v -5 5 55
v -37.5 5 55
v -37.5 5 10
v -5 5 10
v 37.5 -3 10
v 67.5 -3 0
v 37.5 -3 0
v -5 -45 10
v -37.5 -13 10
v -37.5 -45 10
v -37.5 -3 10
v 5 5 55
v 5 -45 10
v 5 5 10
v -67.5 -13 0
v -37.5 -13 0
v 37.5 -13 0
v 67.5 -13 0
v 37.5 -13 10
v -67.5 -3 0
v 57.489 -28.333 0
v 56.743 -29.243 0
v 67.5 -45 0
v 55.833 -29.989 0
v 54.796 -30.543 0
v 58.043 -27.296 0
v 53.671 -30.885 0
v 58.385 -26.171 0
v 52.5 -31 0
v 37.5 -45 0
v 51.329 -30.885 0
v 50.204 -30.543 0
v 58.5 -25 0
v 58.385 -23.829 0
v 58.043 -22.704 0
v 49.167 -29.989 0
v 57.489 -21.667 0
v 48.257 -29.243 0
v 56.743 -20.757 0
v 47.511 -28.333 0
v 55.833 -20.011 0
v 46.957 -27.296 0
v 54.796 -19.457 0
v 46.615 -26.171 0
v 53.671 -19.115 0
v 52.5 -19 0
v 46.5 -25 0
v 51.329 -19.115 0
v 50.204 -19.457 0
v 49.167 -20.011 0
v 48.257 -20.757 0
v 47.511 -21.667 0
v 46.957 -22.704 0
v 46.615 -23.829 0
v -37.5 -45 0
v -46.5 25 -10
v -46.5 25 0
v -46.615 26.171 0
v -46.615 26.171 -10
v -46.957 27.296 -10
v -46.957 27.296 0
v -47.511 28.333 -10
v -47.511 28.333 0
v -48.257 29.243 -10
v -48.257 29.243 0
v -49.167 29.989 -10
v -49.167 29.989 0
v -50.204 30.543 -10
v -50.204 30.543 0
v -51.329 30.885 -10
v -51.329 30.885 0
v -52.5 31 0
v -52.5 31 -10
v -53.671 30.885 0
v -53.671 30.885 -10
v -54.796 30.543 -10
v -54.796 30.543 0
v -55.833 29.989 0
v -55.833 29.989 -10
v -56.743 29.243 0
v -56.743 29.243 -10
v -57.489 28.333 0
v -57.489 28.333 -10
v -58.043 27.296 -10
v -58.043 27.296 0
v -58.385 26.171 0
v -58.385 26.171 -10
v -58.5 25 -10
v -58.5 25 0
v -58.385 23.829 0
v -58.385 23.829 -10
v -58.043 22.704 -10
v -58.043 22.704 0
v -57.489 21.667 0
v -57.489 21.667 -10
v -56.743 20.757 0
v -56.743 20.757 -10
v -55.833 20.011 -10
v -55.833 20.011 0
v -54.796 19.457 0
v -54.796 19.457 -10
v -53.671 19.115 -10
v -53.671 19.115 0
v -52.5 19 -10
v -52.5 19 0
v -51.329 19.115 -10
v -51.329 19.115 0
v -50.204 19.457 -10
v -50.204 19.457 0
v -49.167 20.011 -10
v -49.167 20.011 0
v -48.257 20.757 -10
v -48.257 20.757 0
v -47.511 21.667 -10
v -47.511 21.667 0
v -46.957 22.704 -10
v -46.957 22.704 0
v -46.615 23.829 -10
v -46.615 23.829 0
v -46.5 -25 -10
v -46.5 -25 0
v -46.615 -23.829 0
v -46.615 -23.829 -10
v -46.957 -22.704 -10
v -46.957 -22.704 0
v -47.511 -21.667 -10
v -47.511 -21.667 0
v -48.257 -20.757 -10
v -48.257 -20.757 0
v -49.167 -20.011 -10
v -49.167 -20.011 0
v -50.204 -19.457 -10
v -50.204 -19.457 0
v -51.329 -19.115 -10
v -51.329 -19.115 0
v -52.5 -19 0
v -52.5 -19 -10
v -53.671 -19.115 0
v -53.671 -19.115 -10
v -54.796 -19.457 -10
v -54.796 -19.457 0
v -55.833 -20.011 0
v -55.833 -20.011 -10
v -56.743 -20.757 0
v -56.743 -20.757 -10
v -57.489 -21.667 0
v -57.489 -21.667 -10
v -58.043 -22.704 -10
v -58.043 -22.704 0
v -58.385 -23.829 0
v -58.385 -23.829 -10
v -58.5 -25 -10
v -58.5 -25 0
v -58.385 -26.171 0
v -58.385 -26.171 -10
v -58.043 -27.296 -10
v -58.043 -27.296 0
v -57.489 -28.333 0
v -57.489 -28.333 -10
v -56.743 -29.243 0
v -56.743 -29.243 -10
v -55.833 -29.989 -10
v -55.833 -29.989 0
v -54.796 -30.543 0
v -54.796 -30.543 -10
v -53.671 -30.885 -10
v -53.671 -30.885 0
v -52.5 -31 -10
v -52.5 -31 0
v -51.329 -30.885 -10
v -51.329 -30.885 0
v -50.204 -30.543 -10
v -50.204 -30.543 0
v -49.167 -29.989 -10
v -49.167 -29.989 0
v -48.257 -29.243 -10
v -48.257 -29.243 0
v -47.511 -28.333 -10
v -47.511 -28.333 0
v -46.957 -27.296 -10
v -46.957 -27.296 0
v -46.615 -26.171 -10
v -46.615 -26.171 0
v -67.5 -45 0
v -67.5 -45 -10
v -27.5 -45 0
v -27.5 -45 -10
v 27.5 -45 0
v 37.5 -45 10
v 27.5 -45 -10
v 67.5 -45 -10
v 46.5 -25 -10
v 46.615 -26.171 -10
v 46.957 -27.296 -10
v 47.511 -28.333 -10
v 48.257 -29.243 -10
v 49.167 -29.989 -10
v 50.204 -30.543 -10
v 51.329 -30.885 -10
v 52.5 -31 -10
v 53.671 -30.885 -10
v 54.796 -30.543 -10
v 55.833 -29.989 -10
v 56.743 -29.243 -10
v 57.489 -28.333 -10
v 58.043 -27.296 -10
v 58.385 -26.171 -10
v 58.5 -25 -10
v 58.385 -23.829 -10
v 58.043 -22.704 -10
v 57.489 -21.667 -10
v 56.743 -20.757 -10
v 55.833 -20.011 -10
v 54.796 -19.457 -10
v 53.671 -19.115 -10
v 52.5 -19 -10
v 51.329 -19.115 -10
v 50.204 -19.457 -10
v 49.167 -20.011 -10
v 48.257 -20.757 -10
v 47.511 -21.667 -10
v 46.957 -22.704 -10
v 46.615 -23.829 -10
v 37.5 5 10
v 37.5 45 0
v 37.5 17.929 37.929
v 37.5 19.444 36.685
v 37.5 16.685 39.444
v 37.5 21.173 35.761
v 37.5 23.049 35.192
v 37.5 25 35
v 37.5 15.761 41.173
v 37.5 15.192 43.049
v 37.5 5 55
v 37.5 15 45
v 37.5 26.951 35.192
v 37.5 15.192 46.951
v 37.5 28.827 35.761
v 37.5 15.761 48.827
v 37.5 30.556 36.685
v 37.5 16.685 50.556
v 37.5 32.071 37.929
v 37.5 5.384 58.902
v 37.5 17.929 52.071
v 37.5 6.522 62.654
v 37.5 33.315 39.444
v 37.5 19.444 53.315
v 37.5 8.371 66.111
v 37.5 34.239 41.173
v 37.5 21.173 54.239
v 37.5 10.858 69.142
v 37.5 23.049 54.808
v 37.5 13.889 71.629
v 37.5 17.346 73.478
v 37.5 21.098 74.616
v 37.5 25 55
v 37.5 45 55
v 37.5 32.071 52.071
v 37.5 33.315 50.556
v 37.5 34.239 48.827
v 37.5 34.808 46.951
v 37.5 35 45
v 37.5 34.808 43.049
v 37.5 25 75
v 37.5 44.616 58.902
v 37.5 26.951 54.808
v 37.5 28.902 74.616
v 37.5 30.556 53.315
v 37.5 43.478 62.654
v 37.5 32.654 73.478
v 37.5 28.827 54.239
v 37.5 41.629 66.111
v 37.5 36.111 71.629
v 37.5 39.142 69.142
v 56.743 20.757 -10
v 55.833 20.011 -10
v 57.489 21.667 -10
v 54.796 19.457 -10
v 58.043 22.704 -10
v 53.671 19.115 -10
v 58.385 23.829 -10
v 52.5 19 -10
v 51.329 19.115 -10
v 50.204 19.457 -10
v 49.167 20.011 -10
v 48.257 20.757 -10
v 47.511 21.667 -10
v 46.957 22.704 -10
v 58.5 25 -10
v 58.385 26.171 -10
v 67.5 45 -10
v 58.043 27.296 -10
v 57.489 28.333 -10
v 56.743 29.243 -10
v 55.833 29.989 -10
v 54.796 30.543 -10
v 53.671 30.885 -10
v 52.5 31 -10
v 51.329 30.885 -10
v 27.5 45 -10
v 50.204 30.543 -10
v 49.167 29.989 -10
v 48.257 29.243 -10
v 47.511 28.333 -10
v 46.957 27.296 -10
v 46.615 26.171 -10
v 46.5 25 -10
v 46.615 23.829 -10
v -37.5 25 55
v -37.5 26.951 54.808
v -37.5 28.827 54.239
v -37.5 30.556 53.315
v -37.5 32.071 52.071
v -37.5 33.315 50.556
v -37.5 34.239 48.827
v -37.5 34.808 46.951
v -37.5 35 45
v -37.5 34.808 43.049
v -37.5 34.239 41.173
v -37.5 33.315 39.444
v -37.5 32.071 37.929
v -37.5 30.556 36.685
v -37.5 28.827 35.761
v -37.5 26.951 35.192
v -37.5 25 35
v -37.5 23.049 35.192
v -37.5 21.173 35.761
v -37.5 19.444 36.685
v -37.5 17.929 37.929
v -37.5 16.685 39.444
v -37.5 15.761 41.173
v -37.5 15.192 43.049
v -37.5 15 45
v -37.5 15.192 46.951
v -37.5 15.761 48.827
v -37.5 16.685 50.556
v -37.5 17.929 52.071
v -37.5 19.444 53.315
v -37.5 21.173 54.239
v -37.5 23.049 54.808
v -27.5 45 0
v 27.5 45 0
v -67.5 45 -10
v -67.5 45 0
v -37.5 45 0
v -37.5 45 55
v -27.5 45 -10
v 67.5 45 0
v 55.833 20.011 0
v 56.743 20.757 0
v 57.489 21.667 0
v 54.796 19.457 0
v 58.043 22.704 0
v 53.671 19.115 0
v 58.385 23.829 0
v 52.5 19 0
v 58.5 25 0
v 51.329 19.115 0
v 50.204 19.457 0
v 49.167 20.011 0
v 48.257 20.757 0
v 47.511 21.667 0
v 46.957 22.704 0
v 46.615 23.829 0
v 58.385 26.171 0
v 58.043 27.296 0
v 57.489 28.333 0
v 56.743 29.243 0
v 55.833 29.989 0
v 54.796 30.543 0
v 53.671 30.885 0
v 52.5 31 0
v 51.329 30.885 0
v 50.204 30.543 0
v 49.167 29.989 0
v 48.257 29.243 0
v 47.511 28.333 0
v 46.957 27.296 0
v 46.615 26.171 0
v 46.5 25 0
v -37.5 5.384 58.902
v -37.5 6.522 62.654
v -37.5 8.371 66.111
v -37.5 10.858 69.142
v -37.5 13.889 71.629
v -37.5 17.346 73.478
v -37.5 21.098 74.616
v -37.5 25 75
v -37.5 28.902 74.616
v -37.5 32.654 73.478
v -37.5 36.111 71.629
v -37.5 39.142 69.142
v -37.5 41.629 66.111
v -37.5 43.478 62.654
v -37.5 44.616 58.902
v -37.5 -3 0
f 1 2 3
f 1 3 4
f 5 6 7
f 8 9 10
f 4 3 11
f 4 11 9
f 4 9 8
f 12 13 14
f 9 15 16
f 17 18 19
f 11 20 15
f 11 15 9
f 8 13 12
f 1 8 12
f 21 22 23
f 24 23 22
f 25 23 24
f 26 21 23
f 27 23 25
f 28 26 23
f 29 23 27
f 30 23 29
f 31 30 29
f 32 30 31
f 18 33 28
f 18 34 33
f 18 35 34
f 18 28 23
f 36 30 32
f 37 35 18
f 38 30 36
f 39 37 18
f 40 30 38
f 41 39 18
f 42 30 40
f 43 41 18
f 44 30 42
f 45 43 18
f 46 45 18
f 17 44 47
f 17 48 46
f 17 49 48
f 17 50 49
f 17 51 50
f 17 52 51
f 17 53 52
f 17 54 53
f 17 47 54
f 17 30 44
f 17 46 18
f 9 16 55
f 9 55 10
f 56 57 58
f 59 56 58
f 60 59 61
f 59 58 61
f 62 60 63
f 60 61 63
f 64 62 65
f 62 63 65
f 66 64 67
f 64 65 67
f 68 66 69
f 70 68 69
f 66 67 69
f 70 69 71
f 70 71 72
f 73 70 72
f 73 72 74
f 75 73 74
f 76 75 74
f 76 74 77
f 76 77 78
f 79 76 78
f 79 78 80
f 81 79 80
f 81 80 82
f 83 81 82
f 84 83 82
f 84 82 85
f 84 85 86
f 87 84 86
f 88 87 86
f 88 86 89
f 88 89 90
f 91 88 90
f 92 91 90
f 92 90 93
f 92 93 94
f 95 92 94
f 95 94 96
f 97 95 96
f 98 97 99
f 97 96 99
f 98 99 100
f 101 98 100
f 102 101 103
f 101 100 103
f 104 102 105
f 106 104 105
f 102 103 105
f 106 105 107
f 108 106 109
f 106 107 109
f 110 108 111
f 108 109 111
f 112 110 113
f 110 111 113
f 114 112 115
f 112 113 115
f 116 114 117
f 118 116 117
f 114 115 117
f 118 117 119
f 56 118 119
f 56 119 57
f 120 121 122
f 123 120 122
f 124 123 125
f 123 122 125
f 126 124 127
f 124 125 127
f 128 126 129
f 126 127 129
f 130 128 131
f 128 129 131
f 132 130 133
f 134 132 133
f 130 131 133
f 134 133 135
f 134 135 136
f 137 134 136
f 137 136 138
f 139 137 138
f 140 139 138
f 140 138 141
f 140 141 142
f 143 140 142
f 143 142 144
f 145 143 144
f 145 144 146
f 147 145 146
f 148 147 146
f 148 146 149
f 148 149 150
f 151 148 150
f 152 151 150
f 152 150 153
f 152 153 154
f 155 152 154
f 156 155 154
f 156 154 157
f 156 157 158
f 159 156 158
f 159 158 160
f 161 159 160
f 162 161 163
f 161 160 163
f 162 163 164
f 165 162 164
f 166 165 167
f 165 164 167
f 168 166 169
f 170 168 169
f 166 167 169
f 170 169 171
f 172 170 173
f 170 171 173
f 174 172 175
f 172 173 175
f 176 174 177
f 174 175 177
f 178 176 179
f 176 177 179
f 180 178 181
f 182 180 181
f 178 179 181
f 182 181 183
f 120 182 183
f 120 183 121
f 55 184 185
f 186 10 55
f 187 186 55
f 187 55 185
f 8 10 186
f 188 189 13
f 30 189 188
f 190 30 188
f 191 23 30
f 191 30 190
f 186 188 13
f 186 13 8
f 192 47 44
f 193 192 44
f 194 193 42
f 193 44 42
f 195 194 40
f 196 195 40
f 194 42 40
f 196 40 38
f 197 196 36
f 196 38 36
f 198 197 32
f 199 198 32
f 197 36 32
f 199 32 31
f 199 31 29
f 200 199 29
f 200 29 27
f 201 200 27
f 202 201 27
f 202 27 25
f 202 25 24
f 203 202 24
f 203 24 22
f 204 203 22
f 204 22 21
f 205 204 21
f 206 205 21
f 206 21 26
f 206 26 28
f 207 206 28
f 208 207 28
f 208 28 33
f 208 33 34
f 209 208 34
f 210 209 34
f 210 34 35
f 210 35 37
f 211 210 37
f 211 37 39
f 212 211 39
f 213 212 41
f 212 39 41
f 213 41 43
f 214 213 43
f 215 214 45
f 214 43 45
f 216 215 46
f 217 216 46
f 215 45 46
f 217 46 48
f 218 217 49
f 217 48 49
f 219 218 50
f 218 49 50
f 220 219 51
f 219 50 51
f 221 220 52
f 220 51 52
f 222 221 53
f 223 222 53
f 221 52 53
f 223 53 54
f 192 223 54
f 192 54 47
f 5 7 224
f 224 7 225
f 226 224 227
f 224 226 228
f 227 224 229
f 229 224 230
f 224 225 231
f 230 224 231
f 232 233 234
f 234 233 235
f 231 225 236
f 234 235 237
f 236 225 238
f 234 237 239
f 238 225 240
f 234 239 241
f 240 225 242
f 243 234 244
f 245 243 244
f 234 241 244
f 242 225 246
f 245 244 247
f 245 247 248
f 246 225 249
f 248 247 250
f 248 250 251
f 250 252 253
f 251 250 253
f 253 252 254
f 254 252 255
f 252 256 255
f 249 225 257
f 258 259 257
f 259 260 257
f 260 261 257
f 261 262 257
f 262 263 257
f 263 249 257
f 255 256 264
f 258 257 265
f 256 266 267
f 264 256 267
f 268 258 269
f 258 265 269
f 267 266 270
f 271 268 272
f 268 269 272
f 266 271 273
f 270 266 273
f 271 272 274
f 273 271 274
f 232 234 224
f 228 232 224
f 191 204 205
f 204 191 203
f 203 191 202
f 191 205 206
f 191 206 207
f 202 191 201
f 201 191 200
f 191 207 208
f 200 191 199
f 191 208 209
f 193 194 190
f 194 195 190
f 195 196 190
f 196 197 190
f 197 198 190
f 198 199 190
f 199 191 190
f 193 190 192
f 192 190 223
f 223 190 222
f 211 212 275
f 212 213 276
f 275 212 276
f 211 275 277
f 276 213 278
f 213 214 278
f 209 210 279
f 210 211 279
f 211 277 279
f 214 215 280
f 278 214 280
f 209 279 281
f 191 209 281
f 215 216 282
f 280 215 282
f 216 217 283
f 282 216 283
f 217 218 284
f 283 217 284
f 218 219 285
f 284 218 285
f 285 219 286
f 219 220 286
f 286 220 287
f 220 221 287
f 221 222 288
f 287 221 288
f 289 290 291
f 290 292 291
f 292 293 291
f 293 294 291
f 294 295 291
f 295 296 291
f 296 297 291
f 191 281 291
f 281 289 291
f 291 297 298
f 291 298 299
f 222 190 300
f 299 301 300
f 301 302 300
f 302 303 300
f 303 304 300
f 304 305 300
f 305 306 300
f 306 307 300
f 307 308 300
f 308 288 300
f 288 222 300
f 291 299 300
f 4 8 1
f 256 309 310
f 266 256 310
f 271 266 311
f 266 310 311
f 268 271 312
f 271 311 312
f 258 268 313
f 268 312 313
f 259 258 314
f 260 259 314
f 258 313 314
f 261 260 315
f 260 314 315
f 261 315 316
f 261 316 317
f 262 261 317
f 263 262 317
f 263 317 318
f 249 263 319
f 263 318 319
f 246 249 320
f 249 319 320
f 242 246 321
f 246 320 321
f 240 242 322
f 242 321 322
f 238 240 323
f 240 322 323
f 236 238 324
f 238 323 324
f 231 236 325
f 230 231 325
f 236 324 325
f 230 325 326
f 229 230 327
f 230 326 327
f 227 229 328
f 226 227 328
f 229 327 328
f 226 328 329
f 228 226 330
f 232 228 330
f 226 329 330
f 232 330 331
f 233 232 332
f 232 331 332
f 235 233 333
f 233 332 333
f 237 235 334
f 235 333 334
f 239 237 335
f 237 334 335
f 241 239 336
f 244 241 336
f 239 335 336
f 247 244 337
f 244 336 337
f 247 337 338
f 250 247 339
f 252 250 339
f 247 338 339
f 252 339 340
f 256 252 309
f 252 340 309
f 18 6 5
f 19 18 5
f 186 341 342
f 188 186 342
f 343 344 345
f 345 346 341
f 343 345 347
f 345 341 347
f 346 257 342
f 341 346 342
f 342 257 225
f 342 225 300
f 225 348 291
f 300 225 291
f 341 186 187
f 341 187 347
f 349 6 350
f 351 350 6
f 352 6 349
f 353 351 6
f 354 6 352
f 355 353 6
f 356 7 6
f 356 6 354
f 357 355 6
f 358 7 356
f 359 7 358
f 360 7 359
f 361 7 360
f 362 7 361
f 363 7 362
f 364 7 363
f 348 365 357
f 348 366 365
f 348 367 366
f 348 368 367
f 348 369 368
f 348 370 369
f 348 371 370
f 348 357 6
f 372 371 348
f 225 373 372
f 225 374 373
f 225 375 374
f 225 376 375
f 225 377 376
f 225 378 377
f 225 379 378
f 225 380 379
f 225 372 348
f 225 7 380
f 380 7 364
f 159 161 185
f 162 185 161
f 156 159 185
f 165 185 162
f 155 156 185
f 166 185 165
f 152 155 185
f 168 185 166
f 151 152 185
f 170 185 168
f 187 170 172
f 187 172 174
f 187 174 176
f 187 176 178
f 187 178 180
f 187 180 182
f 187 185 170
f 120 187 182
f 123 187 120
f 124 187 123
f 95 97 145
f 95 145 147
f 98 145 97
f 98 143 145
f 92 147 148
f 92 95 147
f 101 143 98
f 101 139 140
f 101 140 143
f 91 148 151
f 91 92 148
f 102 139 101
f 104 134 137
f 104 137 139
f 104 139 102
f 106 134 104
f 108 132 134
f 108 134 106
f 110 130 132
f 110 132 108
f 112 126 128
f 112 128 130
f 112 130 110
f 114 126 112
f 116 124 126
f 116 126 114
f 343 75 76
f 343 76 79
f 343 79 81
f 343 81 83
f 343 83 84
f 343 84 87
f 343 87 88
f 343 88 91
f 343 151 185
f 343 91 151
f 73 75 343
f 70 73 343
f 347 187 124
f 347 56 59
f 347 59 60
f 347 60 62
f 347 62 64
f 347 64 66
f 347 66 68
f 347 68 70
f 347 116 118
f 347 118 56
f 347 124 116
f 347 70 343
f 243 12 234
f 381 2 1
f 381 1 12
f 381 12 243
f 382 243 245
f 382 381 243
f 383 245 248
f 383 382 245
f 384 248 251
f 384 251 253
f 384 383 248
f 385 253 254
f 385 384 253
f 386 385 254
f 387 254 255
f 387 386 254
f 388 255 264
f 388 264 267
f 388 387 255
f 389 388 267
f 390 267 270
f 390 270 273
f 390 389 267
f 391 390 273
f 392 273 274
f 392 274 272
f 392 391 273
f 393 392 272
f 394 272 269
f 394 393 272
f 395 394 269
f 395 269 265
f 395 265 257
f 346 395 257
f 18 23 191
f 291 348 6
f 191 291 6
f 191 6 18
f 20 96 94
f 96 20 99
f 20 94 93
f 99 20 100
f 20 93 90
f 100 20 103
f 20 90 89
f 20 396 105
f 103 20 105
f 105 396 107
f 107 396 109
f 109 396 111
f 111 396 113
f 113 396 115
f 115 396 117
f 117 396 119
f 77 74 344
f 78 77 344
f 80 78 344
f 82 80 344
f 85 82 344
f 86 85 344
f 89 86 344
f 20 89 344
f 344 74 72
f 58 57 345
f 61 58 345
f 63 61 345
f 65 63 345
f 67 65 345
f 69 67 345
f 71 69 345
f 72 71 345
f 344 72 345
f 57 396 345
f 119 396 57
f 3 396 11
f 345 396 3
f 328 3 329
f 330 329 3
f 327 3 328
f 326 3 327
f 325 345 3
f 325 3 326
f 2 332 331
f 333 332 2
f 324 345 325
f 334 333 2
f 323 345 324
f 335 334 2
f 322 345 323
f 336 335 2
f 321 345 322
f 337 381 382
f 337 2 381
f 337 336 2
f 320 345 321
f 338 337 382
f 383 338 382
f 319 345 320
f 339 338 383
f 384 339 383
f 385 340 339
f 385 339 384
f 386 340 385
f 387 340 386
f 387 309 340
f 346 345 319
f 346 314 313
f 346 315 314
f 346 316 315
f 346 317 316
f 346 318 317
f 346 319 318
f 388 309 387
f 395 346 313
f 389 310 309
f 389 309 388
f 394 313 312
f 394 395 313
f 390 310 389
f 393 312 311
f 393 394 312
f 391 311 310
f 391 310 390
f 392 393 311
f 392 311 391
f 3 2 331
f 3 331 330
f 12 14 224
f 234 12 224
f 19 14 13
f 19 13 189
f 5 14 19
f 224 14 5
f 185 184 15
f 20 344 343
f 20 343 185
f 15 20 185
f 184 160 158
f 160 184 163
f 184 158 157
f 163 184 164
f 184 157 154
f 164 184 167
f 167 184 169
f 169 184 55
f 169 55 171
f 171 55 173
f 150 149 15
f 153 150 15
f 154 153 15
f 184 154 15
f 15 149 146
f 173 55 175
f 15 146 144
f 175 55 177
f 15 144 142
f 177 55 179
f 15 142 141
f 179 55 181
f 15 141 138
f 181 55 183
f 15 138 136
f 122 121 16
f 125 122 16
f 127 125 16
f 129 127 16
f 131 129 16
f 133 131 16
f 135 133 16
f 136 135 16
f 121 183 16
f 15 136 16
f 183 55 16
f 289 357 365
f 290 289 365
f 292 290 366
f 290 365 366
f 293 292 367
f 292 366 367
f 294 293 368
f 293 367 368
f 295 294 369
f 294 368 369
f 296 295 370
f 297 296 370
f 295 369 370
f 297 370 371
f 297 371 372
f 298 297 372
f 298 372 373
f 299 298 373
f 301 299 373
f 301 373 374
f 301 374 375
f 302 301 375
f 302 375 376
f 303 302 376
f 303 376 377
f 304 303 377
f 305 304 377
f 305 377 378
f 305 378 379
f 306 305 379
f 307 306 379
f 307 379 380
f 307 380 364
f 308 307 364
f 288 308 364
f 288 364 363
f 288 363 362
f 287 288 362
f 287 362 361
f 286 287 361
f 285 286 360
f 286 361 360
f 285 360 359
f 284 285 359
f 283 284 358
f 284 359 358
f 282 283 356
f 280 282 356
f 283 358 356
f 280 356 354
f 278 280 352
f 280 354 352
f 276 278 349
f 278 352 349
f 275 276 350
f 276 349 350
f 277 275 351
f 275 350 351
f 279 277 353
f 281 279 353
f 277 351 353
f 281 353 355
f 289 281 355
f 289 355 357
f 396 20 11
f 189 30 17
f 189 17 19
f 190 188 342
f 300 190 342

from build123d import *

# Parameters (mm, degrees)
SKETCH1_W           = 75
SKETCH1_H           = 90
BOSS_EXTRUDE1_DEPTH = 10
SKETCH2_W           = 75
SKETCH2_H           = 40
BOSS_EXTRUDE2_DEPTH = 45
SKETCH5_W           = 10
SKETCH5_H           = 90
BOSS_EXTRUDE3_DEPTH = 10
SKETCH7_W           = 10
SKETCH7_H           = 90
BOSS_EXTRUDE4_DEPTH = 30
SKETCH14_R          = 20
BOSS_EXTRUDE6_DEPTH = 75
SKETCH15_R          = 10
CUT_EXTRUDE3_DEPTH  = 75
SKETCH16_R          = 6
CUT_EXTRUDE4_DEPTH  = 75
RIB16_REACH         = 112.482
SKETCH24_WALL_W     = 290.231918176
SKETCH24_WALL_H     = 10
RIB17_REACH         = 115.975
SKETCH25_WALL_W     = 261.572332424
SKETCH25_WALL_H     = 10
RIB18_REACH         = 115.975
SKETCH26_WALL_W     = 261.572332424
SKETCH26_WALL_H     = 10


with BuildPart() as part:
    # Sketch1 → Boss-Extrude1 (new body)
    with BuildSketch(Plane.XY):
        Rectangle(SKETCH1_W, SKETCH1_H)
    extrude(amount=BOSS_EXTRUDE1_DEPTH)

    # Sketch2 → Boss-Extrude2 (add)
    with BuildSketch(Plane.XY.offset(10)):
        with Locations((0, 25)):
            Rectangle(SKETCH2_W, SKETCH2_H)
    extrude(amount=BOSS_EXTRUDE2_DEPTH)

    # Sketch5 → Boss-Extrude3 (add)
    with BuildSketch(Plane(origin=(0, 0, 0), x_dir=(-1, 0, 0), z_dir=(0, 0, -1))):
        with Locations((-32.5, 0)):
            Rectangle(SKETCH5_W, SKETCH5_H)
        with Locations((32.5, 0)):
            Rectangle(SKETCH5_W, SKETCH5_H)
    boss_extrude3 = extrude(amount=BOSS_EXTRUDE3_DEPTH)

    # Sketch7 → Boss-Extrude4 (add)
    with BuildSketch(Plane(origin=(37.5, 0, 0), x_dir=(0, 0, -1), z_dir=(1, 0, 0))):
        with Locations((5, 0)):
            Rectangle(SKETCH7_W, SKETCH7_H)
    boss_extrude4 = extrude(amount=BOSS_EXTRUDE4_DEPTH)

    # Mirror1: Boss-Extrude3, Boss-Extrude4 across plane
    add(boss_extrude3.mirror(Plane(origin=(0, 0, 0), x_dir=(0, 0, 1), z_dir=(1, 0, 0))))
    add(boss_extrude4.mirror(Plane(origin=(0, 0, 0), x_dir=(0, 0, 1), z_dir=(1, 0, 0))))

    # Sketch14 → Boss-Extrude6 (add)
    with BuildSketch(Plane.ZY.offset(37.5)):
        with Locations((55, 25)):
            Circle(SKETCH14_R)
    extrude(amount=-BOSS_EXTRUDE6_DEPTH)

    # Sketch15 → Cut-Extrude3 (cut)
    with BuildSketch(Plane.ZY.offset(37.5)):
        with Locations((45, 25)):
            Circle(SKETCH15_R)
    extrude(amount=-CUT_EXTRUDE3_DEPTH, mode=Mode.SUBTRACT)

    # Sketch16 → Cut-Extrude4 (cut)
    with BuildSketch(Plane.XY):
        with Locations((-52.5, 25)):
            Circle(SKETCH16_R)
        with Locations((52.5, 25)):
            Circle(SKETCH16_R)
        with Locations(Location((52.5, -25, 0), (0, 0, 180))):
            Circle(SKETCH16_R)
        with Locations((-52.5, -25)):
            Circle(SKETCH16_R)
    extrude(amount=-CUT_EXTRUDE4_DEPTH, mode=Mode.SUBTRACT)

    # Sketch24 wall → Rib16 (add, up to next)
    with BuildSketch(Plane(origin=(0, -20, 32.5), x_dir=(0, 0.743294146247, 0.668964731622), z_dir=(0, 0.668964731622, -0.743294146247)), mode=Mode.PRIVATE) as rib16_sk1:
        Rectangle(SKETCH24_WALL_W, SKETCH24_WALL_H)
    rib16_tool1 = extrude(rib16_sk1.sketch, amount=RIB16_REACH, mode=Mode.PRIVATE) - part.part
    add(rib16_tool1.solids().sort_by_distance((0, -20, 32.5))[0])

    # Sketch25 wall → Rib17 (add, up to next)
    with BuildSketch(Plane(origin=(52.5, -8, 5), x_dir=(-0.948683298051, 0, 0.316227766017), z_dir=(-0.316227766017, 0, -0.948683298051)), mode=Mode.PRIVATE) as rib17_sk1:
        Rectangle(SKETCH25_WALL_W, SKETCH25_WALL_H)
    rib17_tool1 = extrude(rib17_sk1.sketch, amount=RIB17_REACH, mode=Mode.PRIVATE) - part.part
    add(rib17_tool1.solids().sort_by_distance((52.5, -8, 5))[0])

    # Sketch26 wall → Rib18 (add, up to next)
    with BuildSketch(Plane(origin=(-52.5, -8, 5), x_dir=(0.948683298051, 0, 0.316227766017), z_dir=(-0.316227766017, 0, 0.948683298051)), mode=Mode.PRIVATE) as rib18_sk1:
        Rectangle(SKETCH26_WALL_W, SKETCH26_WALL_H)
    rib18_tool1 = extrude(rib18_sk1.sketch, amount=-RIB18_REACH, mode=Mode.PRIVATE) - part.part
    add(rib18_tool1.solids().sort_by_distance((-52.5, -8, 5))[0])


solid = part.part
